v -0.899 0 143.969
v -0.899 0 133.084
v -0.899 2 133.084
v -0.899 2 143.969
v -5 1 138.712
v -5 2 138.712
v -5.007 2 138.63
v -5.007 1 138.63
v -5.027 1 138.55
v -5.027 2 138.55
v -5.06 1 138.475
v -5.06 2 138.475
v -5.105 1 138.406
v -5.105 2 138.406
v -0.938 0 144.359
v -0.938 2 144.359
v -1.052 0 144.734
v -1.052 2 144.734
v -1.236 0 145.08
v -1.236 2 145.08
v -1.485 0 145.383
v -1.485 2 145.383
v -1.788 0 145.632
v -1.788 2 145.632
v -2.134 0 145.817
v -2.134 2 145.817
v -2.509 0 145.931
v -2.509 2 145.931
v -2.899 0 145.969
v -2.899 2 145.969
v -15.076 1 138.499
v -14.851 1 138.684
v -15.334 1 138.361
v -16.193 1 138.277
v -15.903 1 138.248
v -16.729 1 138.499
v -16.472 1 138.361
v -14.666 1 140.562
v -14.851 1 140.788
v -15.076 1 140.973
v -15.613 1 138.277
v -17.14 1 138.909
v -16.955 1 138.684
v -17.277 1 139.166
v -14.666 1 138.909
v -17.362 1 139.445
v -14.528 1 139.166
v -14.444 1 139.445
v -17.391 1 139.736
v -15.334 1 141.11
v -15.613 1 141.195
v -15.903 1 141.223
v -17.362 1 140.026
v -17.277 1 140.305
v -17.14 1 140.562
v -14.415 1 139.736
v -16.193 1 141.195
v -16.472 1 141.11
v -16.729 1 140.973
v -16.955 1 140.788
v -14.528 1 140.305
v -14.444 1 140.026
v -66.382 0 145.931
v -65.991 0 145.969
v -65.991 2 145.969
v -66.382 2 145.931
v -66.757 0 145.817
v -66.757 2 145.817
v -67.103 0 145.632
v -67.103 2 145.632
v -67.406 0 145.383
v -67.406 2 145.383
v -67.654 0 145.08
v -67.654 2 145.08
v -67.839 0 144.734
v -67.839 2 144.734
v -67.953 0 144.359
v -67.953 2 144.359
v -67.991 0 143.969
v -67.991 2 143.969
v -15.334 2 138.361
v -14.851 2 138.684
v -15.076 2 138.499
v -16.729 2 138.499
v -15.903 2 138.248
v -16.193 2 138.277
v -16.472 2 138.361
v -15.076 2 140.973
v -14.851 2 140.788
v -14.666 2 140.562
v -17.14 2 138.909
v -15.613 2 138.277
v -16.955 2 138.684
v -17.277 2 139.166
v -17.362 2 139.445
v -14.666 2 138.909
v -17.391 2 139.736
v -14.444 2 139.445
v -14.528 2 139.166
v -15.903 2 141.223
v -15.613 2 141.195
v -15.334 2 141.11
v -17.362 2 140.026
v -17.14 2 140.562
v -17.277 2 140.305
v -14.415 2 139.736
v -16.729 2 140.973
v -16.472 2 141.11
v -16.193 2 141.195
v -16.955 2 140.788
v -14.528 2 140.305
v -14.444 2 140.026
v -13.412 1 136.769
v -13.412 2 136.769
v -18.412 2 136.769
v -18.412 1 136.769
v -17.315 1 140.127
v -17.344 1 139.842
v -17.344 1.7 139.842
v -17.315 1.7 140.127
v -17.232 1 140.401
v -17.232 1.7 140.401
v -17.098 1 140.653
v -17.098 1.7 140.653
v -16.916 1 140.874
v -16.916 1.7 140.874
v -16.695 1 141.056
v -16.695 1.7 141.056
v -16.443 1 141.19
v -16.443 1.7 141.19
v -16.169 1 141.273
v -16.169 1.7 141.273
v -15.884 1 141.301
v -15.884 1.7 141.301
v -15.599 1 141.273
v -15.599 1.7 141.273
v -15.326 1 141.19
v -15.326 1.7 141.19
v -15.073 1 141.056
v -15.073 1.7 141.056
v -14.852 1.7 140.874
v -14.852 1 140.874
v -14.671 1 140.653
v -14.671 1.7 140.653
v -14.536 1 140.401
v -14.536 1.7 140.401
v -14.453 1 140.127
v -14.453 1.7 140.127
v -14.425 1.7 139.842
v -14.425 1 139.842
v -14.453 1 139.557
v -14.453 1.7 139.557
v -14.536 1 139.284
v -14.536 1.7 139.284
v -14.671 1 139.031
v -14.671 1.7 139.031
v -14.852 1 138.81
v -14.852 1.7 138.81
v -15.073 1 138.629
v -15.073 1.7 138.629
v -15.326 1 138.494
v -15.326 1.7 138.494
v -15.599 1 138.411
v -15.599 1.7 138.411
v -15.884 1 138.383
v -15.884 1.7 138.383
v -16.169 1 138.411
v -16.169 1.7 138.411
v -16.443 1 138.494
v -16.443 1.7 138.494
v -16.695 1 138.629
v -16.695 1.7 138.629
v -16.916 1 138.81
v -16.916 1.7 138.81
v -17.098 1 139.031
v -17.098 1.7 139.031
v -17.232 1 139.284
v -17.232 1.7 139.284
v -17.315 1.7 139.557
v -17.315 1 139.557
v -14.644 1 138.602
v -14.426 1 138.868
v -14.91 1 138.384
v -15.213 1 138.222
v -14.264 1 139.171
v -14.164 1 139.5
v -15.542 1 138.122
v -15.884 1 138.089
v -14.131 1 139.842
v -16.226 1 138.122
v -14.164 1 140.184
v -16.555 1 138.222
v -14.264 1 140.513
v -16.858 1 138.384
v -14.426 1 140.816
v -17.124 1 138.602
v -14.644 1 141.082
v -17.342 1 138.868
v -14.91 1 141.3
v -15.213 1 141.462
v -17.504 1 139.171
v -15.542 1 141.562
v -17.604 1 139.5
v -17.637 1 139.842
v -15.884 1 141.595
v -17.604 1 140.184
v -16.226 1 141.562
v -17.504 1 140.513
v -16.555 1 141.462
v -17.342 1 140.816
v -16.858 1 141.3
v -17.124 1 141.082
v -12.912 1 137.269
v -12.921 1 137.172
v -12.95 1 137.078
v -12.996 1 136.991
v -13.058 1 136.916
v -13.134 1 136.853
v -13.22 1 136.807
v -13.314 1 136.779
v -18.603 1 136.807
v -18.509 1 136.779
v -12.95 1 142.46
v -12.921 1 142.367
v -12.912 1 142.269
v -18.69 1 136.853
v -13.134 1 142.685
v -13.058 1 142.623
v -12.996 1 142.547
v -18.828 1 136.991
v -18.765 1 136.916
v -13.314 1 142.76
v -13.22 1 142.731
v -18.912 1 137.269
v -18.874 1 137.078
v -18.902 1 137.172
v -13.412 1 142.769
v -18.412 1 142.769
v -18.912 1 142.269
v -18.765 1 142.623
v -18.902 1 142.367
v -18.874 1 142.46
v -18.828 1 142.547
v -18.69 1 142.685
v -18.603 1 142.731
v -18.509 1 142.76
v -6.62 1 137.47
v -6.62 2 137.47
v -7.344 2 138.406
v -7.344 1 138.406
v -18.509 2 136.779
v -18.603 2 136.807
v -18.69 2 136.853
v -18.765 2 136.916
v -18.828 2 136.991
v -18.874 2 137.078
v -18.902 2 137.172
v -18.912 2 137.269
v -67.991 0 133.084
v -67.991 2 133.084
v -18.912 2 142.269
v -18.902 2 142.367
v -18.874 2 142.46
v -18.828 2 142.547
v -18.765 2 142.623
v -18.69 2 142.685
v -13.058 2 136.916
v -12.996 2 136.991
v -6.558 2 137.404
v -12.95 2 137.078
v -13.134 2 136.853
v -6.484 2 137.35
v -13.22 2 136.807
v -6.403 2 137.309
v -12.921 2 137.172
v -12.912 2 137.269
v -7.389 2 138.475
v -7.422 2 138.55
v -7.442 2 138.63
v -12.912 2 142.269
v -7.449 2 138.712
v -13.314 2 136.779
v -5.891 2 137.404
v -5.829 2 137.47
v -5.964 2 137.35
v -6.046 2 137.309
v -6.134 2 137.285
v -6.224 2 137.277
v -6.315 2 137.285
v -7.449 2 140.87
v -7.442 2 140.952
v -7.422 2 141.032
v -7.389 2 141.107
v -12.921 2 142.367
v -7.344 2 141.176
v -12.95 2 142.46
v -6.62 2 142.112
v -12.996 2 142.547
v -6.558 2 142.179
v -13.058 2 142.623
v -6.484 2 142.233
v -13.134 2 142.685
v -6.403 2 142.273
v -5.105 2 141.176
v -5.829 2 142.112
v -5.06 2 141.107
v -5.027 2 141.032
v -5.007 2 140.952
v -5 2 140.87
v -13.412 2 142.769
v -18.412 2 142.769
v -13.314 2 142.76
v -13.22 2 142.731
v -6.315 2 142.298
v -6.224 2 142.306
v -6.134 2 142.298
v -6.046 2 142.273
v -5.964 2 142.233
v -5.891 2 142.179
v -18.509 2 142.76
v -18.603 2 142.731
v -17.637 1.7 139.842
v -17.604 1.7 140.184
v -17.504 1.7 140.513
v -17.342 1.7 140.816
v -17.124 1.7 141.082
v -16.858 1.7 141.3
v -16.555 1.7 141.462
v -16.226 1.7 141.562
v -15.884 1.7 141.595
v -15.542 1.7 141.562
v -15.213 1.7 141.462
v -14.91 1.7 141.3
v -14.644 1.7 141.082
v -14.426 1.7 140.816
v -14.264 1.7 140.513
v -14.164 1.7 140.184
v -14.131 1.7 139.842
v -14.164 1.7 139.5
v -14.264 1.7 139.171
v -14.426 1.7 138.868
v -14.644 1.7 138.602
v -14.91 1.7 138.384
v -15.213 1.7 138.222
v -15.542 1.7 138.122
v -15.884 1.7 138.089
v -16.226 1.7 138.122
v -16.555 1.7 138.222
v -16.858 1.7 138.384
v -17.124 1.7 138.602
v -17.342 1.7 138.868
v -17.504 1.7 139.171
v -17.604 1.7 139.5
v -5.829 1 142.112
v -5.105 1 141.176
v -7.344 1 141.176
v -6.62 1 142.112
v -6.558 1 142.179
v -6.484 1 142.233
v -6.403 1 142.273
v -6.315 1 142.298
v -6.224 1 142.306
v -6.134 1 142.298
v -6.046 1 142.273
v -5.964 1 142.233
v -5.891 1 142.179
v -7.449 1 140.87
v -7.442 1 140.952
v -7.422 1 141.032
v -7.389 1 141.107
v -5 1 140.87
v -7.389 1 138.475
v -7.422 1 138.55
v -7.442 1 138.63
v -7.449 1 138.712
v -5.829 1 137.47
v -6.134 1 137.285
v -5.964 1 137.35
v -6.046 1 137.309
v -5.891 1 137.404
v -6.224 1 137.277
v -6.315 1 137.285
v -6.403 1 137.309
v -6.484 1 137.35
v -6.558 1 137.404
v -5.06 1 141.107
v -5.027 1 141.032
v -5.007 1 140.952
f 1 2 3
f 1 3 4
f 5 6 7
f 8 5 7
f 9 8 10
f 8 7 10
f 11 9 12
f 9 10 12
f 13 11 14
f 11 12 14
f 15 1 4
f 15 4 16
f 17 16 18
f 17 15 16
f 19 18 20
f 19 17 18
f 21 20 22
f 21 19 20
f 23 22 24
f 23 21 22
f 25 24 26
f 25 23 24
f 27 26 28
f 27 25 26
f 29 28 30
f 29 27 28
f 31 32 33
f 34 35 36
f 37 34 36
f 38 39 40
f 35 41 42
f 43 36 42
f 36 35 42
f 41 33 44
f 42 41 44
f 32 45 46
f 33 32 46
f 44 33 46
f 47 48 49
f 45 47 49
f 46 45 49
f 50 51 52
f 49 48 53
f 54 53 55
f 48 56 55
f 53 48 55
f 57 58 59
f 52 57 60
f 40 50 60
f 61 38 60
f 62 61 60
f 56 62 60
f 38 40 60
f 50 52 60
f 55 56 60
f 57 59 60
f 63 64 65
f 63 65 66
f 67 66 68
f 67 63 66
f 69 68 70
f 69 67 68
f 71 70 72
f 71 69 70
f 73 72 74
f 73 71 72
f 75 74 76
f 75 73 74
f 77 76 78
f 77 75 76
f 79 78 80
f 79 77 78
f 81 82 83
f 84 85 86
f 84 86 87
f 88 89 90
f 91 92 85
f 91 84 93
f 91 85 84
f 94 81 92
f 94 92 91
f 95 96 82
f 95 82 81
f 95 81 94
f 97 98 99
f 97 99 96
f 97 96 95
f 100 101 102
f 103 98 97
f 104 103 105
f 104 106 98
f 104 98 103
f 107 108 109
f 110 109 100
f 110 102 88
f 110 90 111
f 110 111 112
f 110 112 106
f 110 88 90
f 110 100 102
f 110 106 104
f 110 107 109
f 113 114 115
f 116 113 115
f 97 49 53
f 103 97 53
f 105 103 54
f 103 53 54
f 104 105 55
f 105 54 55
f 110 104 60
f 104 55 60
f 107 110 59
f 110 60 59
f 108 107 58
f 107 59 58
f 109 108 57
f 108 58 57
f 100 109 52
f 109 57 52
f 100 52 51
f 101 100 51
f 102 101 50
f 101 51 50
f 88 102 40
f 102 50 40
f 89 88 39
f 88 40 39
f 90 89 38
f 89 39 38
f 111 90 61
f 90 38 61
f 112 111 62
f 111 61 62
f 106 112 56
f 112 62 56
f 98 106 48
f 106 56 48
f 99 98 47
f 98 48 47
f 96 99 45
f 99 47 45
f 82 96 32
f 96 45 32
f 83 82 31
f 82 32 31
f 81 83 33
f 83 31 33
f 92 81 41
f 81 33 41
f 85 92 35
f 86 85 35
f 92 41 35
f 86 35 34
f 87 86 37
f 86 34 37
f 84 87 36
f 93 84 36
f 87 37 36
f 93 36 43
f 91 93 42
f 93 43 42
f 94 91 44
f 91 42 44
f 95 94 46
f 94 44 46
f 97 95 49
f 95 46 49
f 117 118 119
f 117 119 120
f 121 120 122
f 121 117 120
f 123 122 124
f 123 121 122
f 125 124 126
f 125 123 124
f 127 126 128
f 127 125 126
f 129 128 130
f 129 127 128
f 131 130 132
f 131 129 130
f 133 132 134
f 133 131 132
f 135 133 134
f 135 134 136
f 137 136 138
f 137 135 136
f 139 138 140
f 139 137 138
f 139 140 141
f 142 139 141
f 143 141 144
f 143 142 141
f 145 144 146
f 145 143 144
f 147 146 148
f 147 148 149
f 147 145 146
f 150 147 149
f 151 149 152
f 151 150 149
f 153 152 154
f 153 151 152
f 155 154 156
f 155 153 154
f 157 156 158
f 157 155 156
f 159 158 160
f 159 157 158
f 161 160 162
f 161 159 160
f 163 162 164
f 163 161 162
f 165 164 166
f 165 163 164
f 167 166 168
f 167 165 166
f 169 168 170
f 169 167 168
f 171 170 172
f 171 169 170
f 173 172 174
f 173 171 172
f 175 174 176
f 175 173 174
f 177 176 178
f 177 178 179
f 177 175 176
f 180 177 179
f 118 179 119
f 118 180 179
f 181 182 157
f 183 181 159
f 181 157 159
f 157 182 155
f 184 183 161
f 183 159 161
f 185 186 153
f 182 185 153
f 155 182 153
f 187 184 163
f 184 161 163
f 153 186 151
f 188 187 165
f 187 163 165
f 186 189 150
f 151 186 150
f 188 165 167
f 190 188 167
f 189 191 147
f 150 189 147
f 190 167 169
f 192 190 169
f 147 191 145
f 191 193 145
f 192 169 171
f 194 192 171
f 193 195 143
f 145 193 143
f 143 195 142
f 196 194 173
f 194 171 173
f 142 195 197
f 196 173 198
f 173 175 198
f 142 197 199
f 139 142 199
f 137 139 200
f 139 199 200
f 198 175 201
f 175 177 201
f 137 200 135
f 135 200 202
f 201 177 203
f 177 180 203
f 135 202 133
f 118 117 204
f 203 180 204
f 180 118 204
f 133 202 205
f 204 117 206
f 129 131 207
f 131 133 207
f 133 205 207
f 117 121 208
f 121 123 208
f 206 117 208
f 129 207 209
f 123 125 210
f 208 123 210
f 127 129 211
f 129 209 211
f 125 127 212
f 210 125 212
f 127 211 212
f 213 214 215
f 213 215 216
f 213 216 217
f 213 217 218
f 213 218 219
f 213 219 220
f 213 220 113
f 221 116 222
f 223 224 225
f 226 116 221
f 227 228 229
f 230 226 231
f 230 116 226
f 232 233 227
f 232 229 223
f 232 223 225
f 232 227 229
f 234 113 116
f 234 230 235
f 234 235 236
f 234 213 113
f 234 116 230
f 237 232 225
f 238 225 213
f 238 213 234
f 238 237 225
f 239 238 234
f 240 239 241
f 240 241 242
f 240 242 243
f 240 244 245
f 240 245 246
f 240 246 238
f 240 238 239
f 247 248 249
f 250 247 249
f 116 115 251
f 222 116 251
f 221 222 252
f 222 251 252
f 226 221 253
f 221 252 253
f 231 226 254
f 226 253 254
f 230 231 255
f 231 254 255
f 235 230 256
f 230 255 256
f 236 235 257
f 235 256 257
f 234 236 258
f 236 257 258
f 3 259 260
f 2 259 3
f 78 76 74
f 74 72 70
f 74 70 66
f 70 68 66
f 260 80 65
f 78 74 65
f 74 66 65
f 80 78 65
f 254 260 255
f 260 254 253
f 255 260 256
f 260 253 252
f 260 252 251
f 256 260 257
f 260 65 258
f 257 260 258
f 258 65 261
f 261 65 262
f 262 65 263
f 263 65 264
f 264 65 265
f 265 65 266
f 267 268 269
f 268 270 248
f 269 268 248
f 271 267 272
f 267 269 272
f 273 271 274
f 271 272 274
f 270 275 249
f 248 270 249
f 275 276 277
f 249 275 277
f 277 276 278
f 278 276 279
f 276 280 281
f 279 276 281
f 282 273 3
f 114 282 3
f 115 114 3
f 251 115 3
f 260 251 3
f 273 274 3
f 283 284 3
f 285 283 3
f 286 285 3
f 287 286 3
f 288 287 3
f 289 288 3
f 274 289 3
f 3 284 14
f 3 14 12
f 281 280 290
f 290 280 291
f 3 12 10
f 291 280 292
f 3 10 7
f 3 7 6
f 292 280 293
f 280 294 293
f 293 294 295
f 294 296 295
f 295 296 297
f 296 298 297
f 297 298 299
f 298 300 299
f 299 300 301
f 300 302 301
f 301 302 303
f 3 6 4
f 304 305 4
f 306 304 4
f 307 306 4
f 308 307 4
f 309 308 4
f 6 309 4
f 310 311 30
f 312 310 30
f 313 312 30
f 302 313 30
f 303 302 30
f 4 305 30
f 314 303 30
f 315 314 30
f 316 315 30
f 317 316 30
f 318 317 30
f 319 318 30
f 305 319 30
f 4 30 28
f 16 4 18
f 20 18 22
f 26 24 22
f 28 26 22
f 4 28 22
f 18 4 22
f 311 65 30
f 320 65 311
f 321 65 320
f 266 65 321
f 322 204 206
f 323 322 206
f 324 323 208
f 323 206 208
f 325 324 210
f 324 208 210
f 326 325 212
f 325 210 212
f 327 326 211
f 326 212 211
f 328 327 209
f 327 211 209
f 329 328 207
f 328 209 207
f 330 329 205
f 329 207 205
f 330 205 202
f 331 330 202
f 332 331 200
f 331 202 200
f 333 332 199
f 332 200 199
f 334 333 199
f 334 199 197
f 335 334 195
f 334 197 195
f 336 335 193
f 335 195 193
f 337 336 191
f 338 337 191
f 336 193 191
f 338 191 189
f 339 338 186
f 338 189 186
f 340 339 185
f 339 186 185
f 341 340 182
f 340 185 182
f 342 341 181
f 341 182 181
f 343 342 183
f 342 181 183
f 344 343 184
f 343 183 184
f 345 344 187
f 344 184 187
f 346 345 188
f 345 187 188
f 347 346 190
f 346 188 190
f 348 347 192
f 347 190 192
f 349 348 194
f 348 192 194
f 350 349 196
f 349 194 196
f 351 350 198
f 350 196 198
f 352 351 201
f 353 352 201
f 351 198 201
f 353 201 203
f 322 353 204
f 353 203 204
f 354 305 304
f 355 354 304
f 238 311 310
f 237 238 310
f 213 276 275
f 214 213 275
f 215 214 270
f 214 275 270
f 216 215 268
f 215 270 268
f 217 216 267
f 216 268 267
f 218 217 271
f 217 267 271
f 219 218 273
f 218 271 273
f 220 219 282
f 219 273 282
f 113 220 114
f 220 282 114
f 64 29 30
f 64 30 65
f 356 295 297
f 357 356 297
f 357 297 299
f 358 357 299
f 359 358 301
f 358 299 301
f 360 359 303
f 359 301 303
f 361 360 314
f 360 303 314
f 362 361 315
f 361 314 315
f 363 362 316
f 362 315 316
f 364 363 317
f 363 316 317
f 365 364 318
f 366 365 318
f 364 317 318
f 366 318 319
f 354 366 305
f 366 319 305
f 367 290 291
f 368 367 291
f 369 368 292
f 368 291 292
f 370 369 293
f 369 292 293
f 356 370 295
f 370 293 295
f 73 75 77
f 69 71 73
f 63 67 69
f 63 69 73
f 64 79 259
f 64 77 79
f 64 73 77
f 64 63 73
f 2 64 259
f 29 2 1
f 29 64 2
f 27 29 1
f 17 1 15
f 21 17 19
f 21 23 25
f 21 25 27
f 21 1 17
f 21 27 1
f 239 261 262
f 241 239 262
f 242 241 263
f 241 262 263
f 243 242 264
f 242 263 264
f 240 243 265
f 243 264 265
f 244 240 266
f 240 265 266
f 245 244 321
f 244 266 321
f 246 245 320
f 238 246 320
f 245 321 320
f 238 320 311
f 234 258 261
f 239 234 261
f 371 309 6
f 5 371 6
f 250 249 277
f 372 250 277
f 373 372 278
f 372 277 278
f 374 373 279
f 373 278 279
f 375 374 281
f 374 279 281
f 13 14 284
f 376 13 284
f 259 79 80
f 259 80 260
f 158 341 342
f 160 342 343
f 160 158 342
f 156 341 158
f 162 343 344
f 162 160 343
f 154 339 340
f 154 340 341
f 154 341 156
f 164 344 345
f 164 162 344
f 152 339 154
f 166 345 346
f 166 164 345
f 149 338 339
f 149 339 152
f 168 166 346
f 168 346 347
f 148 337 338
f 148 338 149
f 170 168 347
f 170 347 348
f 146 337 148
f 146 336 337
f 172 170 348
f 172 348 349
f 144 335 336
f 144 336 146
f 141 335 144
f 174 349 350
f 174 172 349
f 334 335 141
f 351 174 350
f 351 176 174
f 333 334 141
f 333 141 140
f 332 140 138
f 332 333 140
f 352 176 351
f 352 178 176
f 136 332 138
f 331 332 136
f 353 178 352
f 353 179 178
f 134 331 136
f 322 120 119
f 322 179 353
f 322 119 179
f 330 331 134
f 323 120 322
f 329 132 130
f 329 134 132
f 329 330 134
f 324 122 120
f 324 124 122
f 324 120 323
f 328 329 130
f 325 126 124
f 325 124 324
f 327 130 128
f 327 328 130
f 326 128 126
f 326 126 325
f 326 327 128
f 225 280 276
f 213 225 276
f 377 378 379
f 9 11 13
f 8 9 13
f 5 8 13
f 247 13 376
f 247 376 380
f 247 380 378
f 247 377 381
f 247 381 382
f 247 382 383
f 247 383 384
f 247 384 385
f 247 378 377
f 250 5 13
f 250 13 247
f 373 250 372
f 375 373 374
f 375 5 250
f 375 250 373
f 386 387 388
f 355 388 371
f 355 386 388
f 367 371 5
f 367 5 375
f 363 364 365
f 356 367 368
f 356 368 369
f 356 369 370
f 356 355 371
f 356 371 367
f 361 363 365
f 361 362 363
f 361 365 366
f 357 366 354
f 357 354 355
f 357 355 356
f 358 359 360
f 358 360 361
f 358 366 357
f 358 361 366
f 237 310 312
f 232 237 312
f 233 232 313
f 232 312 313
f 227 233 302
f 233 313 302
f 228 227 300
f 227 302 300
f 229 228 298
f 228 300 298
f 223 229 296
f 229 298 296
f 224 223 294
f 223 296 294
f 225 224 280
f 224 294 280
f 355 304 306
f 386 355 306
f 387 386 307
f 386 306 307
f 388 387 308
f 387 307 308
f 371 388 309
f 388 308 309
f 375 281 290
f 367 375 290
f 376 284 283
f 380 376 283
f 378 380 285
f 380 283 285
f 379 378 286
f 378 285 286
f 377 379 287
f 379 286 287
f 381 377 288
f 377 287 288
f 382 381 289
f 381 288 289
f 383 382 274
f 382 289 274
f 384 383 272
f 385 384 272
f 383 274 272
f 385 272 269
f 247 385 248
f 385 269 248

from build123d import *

# Parameters (mm, degrees)
F1_DEPTH = 2
F3_DEPTH = 1
F4_R     = 1.753363
F4_R_2   = 1.459412
F5_DEPTH = 0.7
F6_R     = 1.487694
F7_DEPTH = 1


with BuildPart() as f1:
    # F0 (on Front) → F1 (new body)
    with BuildSketch(Plane.XZ):
        with BuildLine():
            Line((-67.99145, 143.969123), (-67.99145, 133.084092))
            Line((-67.99145, 133.084092), (-0.899351, 133.084092))
            Line((-0.899351, 133.084092), (-0.899351, 143.969123))
            ThreePointArc((-0.899351, 143.969123), (-1.485138, 145.383336), (-2.899351, 145.969123))
            Line((-2.899351, 145.969123), (-65.99145, 145.969123))
            ThreePointArc((-65.99145, 145.969123), (-67.405664, 145.383336), (-67.99145, 143.969123))
        make_face()
    extrude(amount=-F1_DEPTH)

    # F2 (on face) → F3 (cut)
    with BuildSketch(Plane(origin=(0, 2, 0), x_dir=(-1, 0, 0), z_dir=(0, 1, 0))):
        with BuildLine():
            ThreePointArc((12.911827, 137.269123), (13.058274, 136.915569), (13.411827, 136.769123))
            Line((13.411827, 136.769123), (18.411827, 136.769123))
            ThreePointArc((18.411827, 136.769123), (18.765381, 136.915569), (18.911827, 137.269123))
            Line((18.911827, 137.269123), (18.911827, 142.269123))
            ThreePointArc((18.911827, 142.269123), (18.765381, 142.622676), (18.411827, 142.769123))
            Line((18.411827, 142.769123), (13.411827, 142.769123))
            ThreePointArc((13.411827, 142.769123), (13.058274, 142.622676), (12.911827, 142.269123))
            Line((12.911827, 142.269123), (12.911827, 137.269123))
        make_face()
        with BuildLine():
            ThreePointArc((6.619622, 142.111984), (6.224257, 142.305902), (5.828891, 142.111984))
            Line((5.828891, 142.111984), (5.104562, 141.176371))
            ThreePointArc((5.104562, 141.176371), (5.026809, 141.032026), (4.999928, 140.870289))
            Line((4.999928, 140.870289), (4.999928, 138.712141))
            ThreePointArc((4.999928, 138.712141), (5.026809, 138.550405), (5.104562, 138.406059))
            Line((5.104562, 138.406059), (5.828891, 137.470446))
            ThreePointArc((5.828891, 137.470446), (6.224257, 137.276528), (6.619622, 137.470446))
            Line((6.619622, 137.470446), (7.343951, 138.406059))
            ThreePointArc((7.343951, 138.406059), (7.421704, 138.550405), (7.448586, 138.712141))
            Line((7.448586, 138.712141), (7.448586, 140.870289))
            ThreePointArc((7.448586, 140.870289), (7.421704, 141.032026), (7.343951, 141.176371))
            Line((7.343951, 141.176371), (6.619622, 142.111984))
        make_face()
    extrude(amount=-F3_DEPTH, mode=Mode.SUBTRACT)


with BuildPart() as f5:
    # F4 (on face) → F5 (new body)
    with BuildSketch(Plane(origin=(0, 1, 0), x_dir=(-1, 0, 0), z_dir=(0, 1, 0))):
        with Locations((15.884116, 139.842048)):
            Circle(F4_R)
        with Locations((15.884116, 139.842048)):
            Circle(F4_R_2, mode=Mode.SUBTRACT)
    extrude(amount=F5_DEPTH)


with BuildPart() as f7:
    # F6 (on face) → F7 (new body)
    with BuildSketch(Plane(origin=(0, 1, 0), x_dir=(-1, 0, 0), z_dir=(0, 1, 0))):
        with Locations((15.902845, 139.735669)):
            Circle(F6_R)
    extrude(amount=F7_DEPTH)


solid = Compound([f1.part, f5.part, f7.part])
